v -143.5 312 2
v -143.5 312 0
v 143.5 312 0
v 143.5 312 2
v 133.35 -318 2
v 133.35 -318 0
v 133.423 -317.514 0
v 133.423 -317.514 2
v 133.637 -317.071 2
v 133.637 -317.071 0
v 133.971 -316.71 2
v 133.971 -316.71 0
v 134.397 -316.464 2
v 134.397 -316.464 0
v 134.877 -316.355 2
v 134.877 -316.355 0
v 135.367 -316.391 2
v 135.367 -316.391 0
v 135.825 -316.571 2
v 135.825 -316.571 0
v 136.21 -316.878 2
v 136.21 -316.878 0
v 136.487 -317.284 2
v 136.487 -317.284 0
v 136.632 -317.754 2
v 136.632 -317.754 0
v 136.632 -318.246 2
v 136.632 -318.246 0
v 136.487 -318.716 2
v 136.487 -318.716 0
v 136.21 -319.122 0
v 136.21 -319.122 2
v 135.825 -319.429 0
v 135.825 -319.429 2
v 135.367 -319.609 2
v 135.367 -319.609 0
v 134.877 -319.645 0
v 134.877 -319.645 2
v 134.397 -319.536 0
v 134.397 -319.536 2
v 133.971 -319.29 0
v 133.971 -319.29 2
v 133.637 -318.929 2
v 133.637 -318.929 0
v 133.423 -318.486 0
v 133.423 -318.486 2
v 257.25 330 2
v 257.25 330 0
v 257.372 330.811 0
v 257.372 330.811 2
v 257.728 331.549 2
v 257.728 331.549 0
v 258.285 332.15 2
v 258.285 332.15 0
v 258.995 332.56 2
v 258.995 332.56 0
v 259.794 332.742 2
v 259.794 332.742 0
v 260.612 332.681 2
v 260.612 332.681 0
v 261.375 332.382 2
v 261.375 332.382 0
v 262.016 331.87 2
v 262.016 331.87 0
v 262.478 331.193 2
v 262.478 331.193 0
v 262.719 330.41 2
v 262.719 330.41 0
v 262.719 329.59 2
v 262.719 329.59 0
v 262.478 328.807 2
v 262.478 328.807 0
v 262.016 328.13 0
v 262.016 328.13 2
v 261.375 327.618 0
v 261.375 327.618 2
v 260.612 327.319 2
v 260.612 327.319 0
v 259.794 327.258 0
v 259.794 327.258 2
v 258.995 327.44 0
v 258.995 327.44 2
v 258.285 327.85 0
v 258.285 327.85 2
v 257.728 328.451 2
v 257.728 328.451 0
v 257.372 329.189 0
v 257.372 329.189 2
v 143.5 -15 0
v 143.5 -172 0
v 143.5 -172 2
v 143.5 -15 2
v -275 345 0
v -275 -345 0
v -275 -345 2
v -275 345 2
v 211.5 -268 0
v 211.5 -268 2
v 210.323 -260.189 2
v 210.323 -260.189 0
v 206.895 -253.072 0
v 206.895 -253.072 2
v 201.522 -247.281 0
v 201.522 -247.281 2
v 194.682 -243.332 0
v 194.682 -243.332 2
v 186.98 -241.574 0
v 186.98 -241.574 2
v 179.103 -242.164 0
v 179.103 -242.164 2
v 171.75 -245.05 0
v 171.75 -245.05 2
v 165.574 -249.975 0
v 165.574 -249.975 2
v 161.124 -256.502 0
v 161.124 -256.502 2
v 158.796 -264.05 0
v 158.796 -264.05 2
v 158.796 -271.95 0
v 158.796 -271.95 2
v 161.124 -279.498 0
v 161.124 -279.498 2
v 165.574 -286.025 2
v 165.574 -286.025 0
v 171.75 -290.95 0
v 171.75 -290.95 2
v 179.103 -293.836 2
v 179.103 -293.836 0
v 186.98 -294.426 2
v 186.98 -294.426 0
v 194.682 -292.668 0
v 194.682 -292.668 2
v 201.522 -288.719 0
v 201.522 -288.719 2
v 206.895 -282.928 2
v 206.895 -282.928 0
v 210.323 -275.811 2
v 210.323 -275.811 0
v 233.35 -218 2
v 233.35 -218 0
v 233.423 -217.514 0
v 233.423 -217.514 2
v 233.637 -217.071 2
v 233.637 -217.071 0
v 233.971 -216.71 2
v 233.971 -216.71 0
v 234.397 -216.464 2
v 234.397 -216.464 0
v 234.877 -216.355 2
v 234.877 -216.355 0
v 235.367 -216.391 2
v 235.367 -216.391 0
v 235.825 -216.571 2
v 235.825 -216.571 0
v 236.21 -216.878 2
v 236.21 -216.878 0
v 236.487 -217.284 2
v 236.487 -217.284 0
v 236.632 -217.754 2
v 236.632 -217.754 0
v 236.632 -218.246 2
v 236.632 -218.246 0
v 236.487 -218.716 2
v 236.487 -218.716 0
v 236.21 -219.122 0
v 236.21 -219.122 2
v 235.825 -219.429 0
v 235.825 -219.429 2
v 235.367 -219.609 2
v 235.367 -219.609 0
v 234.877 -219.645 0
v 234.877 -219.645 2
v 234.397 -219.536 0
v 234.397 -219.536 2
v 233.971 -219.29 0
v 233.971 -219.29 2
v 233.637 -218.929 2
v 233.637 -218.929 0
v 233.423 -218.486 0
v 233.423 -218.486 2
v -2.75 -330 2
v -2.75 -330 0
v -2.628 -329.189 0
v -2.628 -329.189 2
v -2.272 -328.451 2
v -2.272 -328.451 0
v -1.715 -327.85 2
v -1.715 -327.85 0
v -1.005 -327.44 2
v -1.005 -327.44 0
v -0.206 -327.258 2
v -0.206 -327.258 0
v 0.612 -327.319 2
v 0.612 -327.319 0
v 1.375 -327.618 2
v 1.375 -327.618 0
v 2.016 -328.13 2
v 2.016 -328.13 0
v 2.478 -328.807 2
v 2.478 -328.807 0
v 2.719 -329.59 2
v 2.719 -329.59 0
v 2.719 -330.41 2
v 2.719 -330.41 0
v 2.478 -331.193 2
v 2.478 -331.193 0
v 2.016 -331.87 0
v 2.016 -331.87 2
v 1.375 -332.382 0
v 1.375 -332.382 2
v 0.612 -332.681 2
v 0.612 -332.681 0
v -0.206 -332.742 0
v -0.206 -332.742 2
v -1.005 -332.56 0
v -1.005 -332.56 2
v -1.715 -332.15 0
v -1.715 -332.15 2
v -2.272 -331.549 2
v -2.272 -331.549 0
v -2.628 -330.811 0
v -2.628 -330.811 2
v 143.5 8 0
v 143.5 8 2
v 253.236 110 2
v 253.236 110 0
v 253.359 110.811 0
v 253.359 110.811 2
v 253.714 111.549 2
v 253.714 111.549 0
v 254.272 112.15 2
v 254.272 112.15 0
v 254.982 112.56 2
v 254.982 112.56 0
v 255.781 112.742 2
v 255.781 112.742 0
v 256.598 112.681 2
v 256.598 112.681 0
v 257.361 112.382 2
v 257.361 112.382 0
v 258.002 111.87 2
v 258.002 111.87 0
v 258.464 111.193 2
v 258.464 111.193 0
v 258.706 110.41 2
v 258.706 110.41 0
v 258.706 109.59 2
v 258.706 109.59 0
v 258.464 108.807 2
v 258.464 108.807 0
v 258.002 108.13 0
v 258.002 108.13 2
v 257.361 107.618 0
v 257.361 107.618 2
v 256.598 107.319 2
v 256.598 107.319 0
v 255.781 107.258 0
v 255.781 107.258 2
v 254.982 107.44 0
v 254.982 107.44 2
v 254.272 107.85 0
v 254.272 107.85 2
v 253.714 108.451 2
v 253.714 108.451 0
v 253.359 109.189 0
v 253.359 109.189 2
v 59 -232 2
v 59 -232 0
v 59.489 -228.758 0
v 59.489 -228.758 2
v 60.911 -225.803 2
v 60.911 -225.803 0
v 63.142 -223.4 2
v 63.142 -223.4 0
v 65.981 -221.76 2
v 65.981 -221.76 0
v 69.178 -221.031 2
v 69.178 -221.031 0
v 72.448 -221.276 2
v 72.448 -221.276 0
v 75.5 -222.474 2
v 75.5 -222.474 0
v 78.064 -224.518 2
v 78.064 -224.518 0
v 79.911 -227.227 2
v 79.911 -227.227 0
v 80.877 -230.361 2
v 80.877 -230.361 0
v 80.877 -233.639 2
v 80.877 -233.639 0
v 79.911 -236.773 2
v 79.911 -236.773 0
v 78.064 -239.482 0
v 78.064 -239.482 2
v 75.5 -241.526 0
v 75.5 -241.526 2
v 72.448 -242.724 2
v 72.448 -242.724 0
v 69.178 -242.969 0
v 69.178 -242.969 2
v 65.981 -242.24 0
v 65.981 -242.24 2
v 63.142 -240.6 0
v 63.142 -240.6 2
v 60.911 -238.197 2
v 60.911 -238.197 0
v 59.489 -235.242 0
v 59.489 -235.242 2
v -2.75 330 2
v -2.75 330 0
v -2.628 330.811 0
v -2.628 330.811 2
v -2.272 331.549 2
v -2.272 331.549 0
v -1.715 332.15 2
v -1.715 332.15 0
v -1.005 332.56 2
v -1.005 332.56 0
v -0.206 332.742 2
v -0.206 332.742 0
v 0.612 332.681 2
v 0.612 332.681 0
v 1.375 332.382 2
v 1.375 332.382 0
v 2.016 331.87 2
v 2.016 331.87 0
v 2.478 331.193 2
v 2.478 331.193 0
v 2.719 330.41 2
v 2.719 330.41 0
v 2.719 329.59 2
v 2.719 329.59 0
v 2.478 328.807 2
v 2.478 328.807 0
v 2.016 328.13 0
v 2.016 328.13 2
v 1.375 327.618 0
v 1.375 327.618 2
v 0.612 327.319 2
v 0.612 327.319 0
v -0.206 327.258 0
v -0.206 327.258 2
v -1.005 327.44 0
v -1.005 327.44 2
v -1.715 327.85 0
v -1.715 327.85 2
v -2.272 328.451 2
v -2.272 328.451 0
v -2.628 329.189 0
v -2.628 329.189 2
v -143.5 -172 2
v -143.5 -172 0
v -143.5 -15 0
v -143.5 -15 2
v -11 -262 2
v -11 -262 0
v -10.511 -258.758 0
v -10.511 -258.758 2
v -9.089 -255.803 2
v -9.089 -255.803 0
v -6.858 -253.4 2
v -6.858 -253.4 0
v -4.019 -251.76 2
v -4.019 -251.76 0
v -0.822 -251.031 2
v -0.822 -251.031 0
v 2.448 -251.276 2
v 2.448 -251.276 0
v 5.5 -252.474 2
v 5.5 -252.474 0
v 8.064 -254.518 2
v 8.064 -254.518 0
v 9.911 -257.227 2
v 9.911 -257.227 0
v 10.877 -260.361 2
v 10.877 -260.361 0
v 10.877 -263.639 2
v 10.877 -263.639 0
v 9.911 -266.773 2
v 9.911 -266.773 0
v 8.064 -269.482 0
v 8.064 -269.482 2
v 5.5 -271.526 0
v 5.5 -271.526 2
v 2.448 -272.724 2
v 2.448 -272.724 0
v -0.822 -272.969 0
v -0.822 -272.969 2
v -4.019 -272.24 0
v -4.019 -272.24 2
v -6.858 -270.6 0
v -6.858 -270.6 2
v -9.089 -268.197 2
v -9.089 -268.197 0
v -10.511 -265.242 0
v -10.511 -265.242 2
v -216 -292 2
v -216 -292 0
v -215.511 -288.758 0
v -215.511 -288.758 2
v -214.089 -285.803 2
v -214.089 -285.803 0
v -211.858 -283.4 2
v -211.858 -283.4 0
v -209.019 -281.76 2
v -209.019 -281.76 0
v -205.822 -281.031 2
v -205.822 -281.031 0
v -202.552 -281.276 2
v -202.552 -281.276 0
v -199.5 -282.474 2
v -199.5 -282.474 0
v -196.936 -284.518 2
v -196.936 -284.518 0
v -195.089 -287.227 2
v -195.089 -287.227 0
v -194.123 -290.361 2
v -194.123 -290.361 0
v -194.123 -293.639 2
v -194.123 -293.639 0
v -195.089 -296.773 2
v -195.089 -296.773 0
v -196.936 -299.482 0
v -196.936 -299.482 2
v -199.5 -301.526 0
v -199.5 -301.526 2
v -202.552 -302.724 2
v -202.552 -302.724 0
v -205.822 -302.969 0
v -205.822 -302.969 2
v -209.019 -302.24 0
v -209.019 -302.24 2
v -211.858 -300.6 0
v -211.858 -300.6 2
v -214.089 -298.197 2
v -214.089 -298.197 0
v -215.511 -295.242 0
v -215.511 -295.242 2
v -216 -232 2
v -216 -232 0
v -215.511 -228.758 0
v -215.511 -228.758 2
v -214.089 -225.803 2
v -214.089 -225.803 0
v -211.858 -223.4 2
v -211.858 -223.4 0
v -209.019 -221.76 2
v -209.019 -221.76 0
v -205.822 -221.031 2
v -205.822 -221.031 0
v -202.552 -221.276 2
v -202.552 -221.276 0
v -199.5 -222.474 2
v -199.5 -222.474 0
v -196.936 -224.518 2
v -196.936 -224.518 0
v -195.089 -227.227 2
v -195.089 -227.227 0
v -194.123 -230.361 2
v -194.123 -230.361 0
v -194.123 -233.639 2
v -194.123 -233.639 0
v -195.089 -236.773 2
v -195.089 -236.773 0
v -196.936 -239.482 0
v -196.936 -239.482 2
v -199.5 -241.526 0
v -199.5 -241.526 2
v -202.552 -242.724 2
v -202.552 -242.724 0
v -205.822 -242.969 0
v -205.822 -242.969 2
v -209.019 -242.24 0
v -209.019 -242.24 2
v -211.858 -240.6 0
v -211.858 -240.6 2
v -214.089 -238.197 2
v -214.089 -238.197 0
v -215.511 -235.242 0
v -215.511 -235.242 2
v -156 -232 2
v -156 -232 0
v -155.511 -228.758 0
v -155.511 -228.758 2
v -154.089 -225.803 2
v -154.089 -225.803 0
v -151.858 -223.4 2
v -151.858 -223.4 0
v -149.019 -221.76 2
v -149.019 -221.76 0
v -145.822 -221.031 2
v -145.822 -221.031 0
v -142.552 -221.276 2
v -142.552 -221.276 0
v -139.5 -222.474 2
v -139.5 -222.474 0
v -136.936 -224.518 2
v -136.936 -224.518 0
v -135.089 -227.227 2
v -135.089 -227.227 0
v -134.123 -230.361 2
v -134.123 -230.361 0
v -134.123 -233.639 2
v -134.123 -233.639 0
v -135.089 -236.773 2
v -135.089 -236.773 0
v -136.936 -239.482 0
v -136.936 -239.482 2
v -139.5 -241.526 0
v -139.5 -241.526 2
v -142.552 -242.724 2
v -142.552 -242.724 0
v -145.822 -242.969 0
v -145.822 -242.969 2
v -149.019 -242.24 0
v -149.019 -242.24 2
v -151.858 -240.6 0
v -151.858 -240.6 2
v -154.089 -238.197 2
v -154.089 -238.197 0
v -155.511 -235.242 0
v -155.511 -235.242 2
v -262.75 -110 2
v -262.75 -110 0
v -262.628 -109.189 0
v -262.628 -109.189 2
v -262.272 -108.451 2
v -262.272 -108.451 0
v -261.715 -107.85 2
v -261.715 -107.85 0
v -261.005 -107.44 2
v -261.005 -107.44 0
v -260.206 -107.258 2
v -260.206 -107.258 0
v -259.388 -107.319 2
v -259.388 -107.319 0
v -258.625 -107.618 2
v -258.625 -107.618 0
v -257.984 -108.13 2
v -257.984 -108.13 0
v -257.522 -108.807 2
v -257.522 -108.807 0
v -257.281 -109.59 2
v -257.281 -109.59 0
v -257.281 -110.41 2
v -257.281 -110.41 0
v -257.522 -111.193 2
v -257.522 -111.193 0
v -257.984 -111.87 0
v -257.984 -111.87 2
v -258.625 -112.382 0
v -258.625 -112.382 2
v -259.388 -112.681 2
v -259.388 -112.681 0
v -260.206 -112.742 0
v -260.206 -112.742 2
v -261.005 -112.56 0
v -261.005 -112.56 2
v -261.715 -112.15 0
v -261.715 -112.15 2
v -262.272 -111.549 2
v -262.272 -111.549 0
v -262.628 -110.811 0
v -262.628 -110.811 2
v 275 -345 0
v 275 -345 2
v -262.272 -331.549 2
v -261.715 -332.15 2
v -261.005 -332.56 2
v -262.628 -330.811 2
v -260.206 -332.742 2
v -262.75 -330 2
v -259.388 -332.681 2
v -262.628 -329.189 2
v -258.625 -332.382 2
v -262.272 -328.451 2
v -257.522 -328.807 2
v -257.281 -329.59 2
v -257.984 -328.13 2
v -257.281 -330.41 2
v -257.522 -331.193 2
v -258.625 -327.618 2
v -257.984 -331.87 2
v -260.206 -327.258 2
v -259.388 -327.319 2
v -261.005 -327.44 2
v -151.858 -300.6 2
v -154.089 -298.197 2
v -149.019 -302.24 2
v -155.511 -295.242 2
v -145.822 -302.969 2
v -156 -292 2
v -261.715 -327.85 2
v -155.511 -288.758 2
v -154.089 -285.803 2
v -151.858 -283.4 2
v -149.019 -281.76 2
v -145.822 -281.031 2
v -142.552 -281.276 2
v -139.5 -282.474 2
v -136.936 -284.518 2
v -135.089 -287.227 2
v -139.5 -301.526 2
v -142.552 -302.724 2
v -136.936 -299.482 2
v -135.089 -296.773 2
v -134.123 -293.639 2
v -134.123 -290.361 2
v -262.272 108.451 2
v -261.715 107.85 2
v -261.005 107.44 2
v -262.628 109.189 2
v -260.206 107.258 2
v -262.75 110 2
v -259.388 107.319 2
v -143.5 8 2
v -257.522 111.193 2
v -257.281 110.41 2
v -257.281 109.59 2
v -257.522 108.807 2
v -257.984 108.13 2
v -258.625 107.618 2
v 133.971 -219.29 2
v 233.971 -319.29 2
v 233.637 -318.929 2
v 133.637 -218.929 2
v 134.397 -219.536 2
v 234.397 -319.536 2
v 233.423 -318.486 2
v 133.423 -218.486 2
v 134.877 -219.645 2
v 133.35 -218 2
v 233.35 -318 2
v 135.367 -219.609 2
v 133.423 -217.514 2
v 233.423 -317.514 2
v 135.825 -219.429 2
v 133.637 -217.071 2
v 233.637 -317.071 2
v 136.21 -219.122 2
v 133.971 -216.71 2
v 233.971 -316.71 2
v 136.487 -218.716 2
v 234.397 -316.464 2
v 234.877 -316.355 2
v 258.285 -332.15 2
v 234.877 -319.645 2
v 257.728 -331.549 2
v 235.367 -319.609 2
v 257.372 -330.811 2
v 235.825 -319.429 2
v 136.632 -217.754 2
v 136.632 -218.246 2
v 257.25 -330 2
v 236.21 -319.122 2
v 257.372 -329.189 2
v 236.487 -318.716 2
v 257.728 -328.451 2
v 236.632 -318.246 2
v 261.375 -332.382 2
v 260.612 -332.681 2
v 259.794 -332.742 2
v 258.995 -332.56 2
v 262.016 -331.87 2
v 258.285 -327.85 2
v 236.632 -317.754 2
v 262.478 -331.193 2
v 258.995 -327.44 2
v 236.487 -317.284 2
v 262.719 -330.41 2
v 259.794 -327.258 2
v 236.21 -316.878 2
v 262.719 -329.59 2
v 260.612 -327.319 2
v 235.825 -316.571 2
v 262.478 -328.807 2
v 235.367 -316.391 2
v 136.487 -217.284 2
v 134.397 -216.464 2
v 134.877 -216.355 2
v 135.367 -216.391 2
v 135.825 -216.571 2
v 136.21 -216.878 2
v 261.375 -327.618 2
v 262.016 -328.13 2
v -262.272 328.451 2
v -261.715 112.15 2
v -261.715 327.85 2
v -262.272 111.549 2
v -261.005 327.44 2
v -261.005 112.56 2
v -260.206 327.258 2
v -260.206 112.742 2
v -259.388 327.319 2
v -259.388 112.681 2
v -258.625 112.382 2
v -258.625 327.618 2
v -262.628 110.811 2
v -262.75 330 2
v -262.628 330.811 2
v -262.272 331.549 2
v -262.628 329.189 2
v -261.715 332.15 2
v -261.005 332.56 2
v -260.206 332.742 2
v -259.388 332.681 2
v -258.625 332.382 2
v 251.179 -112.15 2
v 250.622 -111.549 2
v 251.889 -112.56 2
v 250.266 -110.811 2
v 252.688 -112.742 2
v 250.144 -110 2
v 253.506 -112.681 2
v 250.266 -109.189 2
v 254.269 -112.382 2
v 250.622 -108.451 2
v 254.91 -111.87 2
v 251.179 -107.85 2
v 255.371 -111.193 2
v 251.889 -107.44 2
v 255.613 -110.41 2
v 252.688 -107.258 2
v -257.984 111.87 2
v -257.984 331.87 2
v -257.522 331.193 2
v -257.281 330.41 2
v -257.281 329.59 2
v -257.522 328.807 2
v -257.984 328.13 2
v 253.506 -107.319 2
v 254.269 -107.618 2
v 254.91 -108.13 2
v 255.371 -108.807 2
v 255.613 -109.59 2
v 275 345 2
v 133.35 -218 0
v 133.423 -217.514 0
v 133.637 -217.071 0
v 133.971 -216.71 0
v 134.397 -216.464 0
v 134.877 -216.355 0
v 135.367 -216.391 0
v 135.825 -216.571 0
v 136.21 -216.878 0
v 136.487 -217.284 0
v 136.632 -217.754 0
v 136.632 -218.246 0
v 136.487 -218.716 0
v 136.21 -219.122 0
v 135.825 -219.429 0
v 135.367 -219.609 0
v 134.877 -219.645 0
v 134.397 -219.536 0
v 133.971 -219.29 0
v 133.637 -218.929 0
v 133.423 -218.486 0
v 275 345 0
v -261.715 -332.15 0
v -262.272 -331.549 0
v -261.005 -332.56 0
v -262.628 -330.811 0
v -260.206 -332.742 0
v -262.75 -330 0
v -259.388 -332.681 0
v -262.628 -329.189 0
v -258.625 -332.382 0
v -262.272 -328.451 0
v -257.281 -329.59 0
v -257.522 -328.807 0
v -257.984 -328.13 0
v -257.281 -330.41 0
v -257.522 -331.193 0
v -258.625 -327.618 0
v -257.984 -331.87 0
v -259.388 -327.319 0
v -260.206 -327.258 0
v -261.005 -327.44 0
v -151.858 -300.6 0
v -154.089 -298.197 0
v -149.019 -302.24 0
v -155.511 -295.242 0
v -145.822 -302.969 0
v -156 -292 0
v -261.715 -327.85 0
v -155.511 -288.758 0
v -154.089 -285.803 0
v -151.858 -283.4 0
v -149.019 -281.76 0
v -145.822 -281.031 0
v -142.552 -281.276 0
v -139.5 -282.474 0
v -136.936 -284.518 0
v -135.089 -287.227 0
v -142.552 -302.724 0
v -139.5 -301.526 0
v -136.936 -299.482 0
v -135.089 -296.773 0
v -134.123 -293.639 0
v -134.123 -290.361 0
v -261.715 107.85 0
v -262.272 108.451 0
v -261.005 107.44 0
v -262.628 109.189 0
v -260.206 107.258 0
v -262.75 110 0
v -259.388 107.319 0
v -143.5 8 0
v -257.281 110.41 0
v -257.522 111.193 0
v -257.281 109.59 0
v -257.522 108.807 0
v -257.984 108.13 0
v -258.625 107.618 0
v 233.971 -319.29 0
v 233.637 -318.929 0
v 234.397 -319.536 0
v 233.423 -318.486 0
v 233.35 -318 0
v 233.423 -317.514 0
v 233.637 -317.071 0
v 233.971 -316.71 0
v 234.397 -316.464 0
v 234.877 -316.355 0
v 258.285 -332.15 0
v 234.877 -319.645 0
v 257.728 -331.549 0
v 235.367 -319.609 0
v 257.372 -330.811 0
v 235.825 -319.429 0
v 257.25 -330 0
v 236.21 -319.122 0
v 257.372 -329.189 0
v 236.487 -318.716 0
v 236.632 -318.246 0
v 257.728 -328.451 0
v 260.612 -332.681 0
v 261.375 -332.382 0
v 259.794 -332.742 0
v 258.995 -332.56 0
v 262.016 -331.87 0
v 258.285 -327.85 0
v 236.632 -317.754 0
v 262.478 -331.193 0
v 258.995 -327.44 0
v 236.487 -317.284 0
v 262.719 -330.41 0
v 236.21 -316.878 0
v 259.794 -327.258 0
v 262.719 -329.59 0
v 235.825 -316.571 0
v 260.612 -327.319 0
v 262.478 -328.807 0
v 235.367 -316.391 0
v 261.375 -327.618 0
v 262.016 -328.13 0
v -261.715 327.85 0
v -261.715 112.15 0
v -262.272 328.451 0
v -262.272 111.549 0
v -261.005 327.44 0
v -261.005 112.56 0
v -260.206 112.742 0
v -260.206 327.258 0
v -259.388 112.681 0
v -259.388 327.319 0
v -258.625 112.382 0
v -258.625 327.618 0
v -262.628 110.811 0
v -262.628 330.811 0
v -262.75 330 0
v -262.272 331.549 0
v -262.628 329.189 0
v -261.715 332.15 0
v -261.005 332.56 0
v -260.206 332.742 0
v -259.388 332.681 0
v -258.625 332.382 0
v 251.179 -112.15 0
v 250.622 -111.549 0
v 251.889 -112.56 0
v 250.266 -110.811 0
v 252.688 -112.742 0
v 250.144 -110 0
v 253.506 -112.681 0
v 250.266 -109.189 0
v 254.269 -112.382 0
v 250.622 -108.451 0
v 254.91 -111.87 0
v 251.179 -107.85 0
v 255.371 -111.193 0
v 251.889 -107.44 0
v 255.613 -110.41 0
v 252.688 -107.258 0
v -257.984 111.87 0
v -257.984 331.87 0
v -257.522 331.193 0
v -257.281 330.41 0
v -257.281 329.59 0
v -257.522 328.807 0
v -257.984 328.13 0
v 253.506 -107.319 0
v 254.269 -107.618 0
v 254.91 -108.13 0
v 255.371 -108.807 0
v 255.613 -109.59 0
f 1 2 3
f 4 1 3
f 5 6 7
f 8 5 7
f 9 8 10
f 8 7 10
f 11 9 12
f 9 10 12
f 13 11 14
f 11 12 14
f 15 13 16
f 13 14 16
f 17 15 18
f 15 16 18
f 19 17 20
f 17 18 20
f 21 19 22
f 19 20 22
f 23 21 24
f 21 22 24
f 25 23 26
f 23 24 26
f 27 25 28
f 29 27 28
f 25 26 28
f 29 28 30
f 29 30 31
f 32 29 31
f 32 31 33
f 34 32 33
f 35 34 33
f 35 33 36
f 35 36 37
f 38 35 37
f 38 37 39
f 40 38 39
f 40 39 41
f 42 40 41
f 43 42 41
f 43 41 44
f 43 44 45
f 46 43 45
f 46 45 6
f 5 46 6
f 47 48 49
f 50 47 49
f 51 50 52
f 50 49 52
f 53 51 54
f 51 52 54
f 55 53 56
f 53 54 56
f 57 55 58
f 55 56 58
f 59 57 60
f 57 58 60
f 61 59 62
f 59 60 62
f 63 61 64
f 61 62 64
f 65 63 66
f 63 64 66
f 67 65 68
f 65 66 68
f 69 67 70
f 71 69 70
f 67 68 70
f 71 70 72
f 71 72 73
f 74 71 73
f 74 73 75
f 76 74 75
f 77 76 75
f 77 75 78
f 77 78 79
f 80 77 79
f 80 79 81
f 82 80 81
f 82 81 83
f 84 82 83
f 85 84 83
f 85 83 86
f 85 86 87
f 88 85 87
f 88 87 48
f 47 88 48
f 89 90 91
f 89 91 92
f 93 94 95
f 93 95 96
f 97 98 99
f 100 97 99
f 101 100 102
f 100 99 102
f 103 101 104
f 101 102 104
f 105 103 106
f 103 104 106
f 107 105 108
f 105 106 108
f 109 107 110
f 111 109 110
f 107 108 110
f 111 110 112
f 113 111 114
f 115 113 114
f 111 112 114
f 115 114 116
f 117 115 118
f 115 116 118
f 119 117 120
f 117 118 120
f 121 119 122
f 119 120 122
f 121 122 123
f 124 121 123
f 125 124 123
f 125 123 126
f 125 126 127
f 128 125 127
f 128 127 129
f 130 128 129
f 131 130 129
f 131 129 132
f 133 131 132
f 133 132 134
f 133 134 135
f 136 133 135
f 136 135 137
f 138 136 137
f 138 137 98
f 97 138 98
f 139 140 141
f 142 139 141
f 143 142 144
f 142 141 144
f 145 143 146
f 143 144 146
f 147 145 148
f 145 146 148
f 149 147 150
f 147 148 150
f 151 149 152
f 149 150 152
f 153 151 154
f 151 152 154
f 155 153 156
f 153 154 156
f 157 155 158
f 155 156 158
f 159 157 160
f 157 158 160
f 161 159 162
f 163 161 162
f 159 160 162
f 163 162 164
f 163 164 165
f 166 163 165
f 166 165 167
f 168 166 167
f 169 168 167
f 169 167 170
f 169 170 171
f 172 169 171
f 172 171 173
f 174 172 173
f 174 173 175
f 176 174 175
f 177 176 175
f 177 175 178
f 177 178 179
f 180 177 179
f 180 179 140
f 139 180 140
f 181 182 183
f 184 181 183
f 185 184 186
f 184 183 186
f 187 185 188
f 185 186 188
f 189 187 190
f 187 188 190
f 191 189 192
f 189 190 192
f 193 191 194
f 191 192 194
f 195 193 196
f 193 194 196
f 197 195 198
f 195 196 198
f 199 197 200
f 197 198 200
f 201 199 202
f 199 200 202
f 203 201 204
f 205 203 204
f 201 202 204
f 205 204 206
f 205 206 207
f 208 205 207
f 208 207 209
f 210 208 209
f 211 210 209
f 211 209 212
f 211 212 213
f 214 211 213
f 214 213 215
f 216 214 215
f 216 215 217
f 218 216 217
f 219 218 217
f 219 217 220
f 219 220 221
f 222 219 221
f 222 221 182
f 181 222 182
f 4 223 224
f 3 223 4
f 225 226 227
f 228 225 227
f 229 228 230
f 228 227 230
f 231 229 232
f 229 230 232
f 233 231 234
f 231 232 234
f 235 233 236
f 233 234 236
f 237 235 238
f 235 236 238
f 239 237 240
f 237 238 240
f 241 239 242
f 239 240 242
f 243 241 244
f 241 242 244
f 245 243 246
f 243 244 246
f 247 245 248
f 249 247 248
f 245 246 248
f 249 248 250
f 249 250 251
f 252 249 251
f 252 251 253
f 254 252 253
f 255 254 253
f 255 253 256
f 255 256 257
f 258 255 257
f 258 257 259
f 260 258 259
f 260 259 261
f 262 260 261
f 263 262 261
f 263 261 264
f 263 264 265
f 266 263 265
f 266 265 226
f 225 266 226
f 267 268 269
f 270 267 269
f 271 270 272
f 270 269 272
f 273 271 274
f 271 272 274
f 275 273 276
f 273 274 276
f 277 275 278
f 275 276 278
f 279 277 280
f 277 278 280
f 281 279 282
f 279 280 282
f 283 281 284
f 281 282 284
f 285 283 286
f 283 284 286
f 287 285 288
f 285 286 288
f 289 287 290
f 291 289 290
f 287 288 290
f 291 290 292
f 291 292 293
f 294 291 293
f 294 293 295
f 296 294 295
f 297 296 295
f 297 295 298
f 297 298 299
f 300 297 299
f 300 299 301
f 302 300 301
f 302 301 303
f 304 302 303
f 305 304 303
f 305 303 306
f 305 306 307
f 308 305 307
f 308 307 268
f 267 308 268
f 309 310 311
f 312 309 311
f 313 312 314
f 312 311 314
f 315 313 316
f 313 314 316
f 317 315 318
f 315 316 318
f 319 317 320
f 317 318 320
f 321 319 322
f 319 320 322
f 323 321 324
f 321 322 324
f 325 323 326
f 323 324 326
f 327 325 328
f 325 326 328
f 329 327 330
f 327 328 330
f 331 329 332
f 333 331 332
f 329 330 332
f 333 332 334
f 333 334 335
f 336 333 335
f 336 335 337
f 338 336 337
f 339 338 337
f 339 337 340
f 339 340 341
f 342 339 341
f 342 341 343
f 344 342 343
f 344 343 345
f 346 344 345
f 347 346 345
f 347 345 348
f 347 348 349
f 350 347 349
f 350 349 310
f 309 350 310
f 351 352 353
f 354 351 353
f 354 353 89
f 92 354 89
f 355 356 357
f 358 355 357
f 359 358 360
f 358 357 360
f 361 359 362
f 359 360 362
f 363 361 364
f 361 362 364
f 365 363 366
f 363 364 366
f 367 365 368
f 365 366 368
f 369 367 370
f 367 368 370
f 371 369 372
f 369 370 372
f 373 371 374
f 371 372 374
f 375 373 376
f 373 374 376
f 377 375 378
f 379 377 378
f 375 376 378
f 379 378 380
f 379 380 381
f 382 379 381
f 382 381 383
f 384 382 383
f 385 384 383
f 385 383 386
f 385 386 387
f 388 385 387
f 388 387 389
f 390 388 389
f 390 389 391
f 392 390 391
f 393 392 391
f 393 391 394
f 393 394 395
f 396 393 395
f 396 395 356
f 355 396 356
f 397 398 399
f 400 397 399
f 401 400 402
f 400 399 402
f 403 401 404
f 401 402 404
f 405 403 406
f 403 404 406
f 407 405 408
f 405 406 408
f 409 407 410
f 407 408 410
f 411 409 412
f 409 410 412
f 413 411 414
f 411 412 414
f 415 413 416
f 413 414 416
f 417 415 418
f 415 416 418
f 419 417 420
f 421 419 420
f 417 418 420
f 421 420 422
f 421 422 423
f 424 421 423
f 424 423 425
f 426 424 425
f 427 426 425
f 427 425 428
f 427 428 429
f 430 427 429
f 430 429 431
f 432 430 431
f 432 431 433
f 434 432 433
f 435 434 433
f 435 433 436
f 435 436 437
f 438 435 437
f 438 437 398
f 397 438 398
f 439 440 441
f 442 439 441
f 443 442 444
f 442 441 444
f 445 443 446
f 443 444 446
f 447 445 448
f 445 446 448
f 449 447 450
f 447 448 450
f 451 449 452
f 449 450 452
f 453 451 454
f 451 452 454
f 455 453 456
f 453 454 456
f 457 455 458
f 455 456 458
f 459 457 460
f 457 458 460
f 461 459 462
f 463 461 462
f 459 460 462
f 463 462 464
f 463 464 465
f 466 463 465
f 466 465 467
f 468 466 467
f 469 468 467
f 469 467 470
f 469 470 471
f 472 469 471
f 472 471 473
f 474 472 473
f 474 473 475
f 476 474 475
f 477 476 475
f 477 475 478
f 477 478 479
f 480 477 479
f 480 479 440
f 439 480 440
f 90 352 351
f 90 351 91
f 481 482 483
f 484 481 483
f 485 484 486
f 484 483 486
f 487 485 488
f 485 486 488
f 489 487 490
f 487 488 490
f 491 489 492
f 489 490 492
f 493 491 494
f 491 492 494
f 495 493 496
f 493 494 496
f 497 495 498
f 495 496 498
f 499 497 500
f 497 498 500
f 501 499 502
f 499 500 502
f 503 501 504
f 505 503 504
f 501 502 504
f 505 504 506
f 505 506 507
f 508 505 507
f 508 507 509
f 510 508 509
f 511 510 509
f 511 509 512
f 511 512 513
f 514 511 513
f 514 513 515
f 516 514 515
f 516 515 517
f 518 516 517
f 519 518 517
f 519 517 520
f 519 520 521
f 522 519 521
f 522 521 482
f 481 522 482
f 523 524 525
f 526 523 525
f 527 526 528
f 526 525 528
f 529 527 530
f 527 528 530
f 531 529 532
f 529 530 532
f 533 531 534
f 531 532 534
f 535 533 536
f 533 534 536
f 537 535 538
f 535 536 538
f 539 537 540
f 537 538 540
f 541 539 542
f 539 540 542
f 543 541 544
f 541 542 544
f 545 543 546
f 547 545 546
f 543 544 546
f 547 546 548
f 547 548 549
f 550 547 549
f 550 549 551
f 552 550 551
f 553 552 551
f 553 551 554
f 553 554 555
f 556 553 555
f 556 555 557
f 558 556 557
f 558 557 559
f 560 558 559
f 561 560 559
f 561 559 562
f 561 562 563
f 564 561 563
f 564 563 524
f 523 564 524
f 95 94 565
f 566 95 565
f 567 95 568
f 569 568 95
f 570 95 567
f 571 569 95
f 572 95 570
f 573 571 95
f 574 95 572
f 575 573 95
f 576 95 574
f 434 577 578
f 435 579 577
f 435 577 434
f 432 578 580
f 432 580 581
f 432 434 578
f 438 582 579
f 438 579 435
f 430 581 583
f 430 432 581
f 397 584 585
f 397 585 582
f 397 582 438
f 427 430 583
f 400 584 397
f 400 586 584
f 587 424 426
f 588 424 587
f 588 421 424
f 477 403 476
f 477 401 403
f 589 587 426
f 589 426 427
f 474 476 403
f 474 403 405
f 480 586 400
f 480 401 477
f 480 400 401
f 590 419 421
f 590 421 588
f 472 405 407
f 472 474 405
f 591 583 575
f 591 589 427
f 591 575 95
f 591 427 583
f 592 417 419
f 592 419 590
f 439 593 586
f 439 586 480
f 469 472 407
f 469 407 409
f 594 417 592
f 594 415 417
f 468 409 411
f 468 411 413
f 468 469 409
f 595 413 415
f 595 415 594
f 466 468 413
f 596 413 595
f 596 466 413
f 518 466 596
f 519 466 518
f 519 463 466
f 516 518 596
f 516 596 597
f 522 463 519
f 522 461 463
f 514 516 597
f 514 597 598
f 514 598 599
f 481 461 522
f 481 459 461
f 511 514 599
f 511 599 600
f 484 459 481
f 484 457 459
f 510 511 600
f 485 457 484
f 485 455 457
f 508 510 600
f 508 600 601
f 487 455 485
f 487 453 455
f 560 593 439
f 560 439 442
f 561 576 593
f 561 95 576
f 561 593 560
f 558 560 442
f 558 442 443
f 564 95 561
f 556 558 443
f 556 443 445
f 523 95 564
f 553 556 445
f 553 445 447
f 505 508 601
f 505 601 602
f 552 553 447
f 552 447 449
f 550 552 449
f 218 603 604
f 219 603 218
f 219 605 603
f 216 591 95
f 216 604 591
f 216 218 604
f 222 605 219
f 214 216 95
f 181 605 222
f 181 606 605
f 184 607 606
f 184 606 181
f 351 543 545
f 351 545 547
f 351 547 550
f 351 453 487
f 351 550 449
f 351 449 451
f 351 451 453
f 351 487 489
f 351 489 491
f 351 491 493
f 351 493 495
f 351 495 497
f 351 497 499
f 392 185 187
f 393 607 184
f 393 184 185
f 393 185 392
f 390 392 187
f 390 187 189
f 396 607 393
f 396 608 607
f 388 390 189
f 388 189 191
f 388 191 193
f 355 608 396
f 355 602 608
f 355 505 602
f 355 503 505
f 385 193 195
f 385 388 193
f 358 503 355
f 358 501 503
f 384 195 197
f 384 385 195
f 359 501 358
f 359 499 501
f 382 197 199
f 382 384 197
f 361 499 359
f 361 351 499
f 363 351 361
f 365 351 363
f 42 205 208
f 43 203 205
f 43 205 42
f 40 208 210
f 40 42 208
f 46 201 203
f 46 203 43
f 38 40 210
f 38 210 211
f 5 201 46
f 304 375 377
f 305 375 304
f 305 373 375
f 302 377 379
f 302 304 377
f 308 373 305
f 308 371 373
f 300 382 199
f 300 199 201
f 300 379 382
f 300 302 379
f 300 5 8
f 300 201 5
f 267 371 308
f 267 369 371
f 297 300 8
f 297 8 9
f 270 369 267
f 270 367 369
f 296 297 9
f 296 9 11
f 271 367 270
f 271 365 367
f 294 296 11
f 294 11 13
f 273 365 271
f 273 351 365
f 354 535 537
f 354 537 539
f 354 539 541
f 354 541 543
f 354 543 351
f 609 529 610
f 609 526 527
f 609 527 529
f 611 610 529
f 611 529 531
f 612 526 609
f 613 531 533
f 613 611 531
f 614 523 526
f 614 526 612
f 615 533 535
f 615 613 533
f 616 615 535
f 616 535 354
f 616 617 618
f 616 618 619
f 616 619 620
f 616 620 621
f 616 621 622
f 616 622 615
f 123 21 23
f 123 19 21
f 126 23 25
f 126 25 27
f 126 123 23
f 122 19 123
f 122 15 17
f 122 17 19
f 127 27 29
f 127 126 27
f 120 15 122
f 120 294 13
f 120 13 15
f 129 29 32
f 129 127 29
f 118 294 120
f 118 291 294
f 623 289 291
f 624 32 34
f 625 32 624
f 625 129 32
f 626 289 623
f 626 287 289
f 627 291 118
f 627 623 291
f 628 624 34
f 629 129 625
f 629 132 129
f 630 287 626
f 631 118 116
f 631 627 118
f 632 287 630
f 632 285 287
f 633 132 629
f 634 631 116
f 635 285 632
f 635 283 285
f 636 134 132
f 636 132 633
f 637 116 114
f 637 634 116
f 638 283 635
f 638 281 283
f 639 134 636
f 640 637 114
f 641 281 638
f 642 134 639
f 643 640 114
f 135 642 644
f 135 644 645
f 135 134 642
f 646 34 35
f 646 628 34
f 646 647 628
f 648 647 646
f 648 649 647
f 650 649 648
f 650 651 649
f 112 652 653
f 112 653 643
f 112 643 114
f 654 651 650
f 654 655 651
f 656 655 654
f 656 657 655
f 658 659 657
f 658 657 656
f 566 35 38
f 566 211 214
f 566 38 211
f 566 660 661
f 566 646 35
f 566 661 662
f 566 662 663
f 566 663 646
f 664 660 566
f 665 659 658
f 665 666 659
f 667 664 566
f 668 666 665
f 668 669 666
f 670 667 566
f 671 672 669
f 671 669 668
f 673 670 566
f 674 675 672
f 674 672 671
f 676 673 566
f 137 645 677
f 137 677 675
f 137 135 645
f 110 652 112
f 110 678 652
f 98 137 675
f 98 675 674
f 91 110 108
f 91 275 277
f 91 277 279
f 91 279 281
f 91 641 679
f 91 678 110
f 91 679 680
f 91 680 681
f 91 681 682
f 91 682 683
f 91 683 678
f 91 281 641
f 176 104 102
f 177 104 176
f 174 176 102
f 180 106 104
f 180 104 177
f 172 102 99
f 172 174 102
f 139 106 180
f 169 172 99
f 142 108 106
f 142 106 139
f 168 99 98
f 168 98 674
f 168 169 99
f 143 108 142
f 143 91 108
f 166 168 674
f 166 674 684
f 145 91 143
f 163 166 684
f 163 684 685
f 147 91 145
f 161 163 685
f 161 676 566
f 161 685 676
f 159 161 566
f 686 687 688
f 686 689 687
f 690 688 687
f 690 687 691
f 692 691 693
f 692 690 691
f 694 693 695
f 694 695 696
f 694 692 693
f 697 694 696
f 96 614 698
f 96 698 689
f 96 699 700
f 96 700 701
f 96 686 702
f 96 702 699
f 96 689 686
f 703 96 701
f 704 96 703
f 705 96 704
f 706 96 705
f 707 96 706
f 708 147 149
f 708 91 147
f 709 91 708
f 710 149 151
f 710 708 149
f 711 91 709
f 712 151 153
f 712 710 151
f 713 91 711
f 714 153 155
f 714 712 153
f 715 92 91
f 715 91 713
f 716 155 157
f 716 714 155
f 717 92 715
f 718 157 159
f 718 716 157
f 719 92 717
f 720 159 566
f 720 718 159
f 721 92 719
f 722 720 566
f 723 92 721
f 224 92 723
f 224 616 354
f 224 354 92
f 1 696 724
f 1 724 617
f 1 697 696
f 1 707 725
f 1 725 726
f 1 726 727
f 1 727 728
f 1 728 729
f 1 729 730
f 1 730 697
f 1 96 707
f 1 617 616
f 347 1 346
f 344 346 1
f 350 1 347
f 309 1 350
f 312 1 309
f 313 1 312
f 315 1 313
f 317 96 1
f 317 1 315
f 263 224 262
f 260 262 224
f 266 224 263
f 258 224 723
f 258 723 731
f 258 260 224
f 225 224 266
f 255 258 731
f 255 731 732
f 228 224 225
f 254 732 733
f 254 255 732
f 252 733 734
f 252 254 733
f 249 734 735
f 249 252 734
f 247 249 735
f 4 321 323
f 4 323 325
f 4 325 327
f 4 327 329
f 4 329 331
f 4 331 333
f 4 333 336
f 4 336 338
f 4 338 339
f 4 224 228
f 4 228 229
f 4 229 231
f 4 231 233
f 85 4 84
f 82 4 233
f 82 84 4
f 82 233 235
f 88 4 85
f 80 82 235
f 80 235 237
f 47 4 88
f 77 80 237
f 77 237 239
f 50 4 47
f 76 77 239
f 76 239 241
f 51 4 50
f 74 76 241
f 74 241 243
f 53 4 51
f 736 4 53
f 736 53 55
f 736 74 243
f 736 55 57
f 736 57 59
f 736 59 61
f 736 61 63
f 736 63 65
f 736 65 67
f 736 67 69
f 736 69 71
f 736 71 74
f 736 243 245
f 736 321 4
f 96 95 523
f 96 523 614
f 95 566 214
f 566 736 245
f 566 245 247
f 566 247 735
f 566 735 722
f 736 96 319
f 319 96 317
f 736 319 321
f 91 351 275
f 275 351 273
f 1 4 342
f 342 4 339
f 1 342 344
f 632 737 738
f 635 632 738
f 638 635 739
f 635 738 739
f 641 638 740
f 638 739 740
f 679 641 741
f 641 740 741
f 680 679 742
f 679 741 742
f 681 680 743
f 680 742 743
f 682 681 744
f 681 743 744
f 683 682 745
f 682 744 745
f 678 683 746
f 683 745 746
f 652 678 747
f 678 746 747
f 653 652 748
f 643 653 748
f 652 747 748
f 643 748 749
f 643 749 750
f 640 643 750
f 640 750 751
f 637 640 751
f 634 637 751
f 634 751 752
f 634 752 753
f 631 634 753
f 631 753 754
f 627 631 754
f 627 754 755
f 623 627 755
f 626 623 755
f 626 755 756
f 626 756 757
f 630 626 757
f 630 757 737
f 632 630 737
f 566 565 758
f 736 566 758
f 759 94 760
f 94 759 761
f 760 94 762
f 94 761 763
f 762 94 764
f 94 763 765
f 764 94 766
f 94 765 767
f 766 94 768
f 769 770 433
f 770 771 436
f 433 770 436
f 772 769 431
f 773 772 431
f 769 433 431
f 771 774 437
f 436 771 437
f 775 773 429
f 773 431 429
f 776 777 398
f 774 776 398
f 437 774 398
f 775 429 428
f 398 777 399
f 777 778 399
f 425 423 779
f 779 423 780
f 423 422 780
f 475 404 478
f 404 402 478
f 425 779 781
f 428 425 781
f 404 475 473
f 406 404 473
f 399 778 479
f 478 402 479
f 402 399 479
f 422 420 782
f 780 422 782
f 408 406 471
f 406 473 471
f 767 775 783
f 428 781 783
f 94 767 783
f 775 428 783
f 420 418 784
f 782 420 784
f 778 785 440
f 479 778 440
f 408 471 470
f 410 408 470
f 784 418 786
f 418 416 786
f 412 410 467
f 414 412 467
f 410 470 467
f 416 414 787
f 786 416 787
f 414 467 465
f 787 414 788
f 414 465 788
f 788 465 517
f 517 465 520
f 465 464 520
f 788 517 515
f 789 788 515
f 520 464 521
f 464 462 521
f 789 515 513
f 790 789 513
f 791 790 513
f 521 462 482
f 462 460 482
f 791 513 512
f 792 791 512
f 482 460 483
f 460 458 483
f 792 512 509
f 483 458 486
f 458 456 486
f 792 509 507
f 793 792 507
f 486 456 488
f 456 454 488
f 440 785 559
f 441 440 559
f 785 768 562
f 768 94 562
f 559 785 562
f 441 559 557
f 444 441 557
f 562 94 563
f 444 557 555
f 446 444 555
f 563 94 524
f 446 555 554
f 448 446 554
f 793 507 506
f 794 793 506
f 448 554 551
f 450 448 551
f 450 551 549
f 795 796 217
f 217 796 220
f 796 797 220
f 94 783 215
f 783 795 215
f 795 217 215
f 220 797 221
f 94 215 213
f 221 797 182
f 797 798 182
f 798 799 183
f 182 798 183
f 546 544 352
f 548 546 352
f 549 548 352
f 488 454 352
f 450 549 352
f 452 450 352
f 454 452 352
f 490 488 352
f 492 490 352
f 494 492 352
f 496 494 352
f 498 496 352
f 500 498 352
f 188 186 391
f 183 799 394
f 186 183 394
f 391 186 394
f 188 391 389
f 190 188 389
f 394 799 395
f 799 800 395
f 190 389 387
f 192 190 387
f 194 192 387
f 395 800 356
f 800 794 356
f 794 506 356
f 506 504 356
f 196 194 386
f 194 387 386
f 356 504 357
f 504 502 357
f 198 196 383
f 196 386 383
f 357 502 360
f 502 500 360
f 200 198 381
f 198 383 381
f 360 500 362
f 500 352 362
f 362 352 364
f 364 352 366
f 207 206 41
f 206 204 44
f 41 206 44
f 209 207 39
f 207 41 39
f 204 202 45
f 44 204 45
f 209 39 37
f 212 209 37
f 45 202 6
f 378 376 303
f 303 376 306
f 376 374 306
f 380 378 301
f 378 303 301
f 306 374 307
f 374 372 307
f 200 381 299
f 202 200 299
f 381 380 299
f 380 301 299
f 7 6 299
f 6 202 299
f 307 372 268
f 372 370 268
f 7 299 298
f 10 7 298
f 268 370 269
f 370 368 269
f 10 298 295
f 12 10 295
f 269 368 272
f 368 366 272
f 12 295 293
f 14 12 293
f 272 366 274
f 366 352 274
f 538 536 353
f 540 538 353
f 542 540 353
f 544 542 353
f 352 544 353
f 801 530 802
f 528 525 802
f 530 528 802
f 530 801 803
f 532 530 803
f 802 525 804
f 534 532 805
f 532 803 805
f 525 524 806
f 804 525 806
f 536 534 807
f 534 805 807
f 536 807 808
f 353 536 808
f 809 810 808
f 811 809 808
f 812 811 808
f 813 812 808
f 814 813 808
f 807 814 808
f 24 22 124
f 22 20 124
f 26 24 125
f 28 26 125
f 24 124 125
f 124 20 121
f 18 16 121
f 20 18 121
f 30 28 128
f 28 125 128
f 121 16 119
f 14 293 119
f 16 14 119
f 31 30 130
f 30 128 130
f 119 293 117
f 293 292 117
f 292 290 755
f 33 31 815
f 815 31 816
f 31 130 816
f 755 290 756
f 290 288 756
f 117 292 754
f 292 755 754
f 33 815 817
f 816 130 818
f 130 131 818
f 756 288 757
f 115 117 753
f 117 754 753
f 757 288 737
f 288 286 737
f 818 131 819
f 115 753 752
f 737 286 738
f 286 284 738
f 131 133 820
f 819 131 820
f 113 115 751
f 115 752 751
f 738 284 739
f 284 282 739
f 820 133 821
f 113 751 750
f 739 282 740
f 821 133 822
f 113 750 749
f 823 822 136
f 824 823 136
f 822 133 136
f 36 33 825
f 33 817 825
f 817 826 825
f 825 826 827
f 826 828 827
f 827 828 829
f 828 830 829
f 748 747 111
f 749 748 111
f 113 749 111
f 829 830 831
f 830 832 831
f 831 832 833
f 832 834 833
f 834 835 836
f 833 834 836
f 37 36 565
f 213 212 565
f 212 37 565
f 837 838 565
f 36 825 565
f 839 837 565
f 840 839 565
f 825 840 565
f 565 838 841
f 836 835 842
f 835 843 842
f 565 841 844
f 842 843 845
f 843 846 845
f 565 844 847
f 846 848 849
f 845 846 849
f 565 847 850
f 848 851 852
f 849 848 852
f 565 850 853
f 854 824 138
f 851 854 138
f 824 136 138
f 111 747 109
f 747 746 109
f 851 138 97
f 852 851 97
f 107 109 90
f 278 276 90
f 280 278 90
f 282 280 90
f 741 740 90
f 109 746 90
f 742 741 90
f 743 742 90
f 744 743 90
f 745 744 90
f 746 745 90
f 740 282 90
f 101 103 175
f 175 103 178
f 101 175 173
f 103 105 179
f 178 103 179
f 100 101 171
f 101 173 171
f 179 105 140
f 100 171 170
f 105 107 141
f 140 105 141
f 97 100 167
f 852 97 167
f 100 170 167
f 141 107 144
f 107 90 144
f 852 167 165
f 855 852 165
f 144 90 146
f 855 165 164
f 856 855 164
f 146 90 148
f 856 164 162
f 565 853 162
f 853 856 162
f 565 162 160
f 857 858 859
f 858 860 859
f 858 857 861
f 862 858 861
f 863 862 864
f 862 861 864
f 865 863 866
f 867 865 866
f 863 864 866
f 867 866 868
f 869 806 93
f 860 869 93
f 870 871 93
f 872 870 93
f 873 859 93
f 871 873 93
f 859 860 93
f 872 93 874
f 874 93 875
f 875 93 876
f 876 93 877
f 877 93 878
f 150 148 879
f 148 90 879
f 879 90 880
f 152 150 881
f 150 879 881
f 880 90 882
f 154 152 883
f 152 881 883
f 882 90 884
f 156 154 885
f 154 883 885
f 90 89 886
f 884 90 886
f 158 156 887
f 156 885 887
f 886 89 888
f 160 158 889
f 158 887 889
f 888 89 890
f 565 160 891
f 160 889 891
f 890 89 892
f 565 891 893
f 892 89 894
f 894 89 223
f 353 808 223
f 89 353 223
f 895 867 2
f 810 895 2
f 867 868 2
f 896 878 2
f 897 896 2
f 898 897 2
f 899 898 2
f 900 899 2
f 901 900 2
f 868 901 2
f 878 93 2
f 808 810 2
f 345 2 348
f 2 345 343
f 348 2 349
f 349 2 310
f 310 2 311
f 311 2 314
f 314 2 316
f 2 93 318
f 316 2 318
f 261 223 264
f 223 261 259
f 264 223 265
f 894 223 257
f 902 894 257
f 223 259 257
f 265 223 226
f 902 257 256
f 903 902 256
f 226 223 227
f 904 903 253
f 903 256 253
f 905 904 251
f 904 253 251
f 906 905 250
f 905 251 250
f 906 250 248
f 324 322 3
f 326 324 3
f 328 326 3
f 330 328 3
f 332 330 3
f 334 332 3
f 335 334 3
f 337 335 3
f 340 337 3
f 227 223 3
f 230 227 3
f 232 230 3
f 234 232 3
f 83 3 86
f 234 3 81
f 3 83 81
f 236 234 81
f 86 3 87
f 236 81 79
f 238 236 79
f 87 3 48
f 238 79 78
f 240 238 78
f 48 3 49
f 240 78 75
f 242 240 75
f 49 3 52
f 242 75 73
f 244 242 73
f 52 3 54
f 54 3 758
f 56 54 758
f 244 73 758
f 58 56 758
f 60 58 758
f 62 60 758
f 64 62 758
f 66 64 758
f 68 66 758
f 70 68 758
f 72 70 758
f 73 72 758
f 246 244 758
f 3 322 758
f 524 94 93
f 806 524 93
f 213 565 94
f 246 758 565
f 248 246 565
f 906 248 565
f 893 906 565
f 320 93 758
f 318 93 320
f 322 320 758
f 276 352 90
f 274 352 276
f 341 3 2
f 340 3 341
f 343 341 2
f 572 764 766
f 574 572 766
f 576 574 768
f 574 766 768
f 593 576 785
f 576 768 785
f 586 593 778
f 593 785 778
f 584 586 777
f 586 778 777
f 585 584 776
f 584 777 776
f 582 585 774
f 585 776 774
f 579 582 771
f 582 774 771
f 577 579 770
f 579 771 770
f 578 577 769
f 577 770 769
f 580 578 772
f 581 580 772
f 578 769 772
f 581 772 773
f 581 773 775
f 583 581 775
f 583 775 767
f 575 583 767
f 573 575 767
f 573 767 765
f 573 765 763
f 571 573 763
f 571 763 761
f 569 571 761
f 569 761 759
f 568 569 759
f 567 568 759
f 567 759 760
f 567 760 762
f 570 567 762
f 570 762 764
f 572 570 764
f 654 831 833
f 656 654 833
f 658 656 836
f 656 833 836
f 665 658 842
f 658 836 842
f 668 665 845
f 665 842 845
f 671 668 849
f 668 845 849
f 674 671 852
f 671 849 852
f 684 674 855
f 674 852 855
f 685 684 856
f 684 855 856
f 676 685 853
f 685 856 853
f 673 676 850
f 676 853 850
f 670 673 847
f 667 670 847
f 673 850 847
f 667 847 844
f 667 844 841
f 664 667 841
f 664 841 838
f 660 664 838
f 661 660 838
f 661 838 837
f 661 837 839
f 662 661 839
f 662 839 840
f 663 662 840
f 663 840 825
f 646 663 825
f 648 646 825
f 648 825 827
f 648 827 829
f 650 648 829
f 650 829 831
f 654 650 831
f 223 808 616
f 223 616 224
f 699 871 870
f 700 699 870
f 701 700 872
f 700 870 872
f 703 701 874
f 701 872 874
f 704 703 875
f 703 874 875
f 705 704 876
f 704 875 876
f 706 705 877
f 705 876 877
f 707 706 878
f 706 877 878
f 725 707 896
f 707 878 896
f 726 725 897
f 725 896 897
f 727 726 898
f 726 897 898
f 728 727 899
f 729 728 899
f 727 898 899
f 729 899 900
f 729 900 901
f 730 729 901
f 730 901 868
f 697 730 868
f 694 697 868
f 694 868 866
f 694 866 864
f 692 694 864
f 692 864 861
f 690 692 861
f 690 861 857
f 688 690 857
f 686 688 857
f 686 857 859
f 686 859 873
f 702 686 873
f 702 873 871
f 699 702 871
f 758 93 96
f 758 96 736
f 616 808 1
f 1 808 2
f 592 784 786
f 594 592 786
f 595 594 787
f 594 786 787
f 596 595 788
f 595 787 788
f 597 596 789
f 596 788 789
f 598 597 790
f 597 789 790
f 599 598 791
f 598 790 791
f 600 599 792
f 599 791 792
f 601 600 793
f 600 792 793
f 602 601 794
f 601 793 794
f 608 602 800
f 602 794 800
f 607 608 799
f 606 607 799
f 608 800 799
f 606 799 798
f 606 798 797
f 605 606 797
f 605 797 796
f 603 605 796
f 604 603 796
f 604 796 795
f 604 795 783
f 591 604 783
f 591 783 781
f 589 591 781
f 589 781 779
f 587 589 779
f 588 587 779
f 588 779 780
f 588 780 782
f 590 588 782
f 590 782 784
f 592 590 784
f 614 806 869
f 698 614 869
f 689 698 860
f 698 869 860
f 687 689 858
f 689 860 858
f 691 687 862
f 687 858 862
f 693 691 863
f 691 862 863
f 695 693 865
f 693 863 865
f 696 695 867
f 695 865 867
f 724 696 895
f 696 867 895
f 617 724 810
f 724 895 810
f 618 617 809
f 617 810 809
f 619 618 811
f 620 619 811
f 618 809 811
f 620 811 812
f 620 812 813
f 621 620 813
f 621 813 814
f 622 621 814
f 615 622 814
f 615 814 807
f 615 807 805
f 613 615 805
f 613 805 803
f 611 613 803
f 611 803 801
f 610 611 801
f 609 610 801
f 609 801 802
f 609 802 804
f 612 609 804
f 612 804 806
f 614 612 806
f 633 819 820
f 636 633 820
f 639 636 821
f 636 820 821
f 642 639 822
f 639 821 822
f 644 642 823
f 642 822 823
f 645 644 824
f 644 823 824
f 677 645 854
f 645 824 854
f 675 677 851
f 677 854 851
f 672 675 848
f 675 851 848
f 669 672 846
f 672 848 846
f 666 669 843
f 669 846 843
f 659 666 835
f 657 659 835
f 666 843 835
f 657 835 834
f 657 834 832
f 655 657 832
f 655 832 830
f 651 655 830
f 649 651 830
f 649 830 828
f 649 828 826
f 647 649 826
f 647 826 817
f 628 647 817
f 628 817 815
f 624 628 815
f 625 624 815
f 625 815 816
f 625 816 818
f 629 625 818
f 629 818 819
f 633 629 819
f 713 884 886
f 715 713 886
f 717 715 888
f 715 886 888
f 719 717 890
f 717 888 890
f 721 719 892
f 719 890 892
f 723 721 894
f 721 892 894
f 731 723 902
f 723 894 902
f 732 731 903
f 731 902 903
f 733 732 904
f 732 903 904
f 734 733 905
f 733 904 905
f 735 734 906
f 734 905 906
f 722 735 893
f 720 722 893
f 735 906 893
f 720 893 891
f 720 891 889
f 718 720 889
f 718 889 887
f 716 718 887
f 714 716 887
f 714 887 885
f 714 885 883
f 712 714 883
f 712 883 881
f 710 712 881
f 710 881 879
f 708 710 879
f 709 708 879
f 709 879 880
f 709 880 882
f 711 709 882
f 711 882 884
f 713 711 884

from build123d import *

# Parameters (mm, degrees)
F0_W     = 550
F0_H     = 690
F0_W_2   = 287
F0_H_2   = 157
F0_H_3   = 304
F1_DEPTH = 2
F2_R     = 26.5
F3_DEPTH = 2.001
F5_D     = 3.3
F7_D     = 22
F10_D    = 5.5


with BuildPart() as f1:
    # F0 (on Top) → F1 (new body)
    with BuildSketch(Plane.XY):
        Rectangle(F0_W, F0_H)
        with Locations((0, -93.5)):
            Rectangle(F0_W_2, F0_H_2, mode=Mode.SUBTRACT)
        with Locations((0, 160)):
            Rectangle(F0_W_2, F0_H_3, mode=Mode.SUBTRACT)
    extrude(amount=F1_DEPTH)

    # F2 (on face) → F3 (cut, through all)
    with BuildSketch(Plane.XY.offset(2)):
        with Locations((185, -268)):
            Circle(F2_R)
    extrude(amount=-F3_DEPTH, mode=Mode.SUBTRACT)

    # F5 (through all)
    with Locations(Plane.XY.offset(2)):
        with Locations((135, -218), (235, -218), (235, -318), (135, -318)):
            Hole(F5_D / 2)

    # F7 (through all)
    with Locations(Plane.XY.offset(2)):
        with Locations((-205, -232), (-145, -232), (0, -262), (70, -232), (-205, -292), (-145, -292)):
            Hole(F7_D / 2)

    # F10 (through all)
    with Locations(Plane.XY.offset(2)):
        with Locations((-260, 330), (0, 330), (260, 330), (255.986392498, 110), (252.8937458992, -110), (260, -330), (0, -330), (-260, -330), (-260, -110), (-260, 110)):
            Hole(F10_D / 2)


solid = f1.part
